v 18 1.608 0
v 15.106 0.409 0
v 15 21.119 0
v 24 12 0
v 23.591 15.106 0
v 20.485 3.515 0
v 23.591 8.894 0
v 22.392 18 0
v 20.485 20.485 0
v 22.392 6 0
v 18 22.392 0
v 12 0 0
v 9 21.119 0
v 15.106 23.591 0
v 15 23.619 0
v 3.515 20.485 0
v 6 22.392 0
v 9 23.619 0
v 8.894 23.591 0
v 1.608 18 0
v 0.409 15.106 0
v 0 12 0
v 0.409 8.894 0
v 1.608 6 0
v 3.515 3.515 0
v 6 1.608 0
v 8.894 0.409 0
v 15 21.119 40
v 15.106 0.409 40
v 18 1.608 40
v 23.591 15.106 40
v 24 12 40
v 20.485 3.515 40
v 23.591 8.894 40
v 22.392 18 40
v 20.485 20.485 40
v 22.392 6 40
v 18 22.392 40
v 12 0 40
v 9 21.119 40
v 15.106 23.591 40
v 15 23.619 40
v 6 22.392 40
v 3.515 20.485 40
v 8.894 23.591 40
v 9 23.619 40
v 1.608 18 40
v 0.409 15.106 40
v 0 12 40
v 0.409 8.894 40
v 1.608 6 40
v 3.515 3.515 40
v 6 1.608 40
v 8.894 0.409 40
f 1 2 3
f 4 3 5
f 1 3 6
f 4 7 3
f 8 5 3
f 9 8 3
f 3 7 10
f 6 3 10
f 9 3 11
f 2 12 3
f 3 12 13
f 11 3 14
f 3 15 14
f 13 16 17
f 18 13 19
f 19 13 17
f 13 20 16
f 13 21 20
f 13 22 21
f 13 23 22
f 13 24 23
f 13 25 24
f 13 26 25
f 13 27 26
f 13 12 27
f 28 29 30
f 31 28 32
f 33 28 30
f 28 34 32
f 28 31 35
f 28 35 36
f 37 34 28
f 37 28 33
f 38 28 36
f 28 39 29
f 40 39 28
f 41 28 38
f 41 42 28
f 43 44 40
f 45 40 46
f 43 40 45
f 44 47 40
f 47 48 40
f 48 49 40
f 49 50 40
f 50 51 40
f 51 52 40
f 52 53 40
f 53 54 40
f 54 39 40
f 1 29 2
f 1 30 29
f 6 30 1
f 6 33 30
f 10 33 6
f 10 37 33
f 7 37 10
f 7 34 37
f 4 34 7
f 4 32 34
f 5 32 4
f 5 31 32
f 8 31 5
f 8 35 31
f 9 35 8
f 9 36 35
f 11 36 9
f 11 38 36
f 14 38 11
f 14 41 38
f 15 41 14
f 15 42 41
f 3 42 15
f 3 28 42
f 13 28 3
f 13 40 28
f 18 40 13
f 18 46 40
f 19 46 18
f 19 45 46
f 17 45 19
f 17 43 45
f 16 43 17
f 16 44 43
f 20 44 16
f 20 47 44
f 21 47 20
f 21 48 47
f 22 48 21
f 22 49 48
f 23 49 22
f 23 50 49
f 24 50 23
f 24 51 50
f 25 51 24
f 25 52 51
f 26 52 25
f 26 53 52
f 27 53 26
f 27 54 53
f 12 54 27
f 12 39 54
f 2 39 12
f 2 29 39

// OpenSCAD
$fn = 32;

// ----------------------------------------------------------------------
// Keyway shaft: d24 shaft, key 6 x 2.5 mm
// ----------------------------------------------------------------------

// --- parameters (mm) ---
shaft_r = 12;             // shaft radius
key_w = 6;                // keyway width
key_d = 2.5;              // keyway depth below the surface line
plate_t = 40;             // shaft length, Z (extrusion height)
fit_tol = 0.05;           // declared fit tolerance (prompt contract)
free_tol = 0.3;           // declared free tolerance (prompt contract)

shaft_d = 2 * shaft_r;  // shaft diameter
circle_step = 15;  // polygon sampling step, degrees

profile = [[8.894, 23.591], [6, 22.392], [3.515, 20.485], [1.608, 18], [0.409, 15.106], [0, 12], [0.409, 8.894], [1.608, 6], [3.515, 3.515], [6, 1.608], [8.894, 0.409], [12, 0], [15.106, 0.409], [18, 1.608], [20.485, 3.515], [22.392, 6], [23.591, 8.894], [24, 12], [23.591, 15.106], [22.392, 18], [20.485, 20.485], [18, 22.392], [15.106, 23.591], [15, 23.619], [15, 21.119], [9, 21.119], [9, 23.619]];  // primary outline, 27 points, counter clockwise

// --- the one profile operation ---
linear_extrude(height = plate_t) polygon(points = profile);
